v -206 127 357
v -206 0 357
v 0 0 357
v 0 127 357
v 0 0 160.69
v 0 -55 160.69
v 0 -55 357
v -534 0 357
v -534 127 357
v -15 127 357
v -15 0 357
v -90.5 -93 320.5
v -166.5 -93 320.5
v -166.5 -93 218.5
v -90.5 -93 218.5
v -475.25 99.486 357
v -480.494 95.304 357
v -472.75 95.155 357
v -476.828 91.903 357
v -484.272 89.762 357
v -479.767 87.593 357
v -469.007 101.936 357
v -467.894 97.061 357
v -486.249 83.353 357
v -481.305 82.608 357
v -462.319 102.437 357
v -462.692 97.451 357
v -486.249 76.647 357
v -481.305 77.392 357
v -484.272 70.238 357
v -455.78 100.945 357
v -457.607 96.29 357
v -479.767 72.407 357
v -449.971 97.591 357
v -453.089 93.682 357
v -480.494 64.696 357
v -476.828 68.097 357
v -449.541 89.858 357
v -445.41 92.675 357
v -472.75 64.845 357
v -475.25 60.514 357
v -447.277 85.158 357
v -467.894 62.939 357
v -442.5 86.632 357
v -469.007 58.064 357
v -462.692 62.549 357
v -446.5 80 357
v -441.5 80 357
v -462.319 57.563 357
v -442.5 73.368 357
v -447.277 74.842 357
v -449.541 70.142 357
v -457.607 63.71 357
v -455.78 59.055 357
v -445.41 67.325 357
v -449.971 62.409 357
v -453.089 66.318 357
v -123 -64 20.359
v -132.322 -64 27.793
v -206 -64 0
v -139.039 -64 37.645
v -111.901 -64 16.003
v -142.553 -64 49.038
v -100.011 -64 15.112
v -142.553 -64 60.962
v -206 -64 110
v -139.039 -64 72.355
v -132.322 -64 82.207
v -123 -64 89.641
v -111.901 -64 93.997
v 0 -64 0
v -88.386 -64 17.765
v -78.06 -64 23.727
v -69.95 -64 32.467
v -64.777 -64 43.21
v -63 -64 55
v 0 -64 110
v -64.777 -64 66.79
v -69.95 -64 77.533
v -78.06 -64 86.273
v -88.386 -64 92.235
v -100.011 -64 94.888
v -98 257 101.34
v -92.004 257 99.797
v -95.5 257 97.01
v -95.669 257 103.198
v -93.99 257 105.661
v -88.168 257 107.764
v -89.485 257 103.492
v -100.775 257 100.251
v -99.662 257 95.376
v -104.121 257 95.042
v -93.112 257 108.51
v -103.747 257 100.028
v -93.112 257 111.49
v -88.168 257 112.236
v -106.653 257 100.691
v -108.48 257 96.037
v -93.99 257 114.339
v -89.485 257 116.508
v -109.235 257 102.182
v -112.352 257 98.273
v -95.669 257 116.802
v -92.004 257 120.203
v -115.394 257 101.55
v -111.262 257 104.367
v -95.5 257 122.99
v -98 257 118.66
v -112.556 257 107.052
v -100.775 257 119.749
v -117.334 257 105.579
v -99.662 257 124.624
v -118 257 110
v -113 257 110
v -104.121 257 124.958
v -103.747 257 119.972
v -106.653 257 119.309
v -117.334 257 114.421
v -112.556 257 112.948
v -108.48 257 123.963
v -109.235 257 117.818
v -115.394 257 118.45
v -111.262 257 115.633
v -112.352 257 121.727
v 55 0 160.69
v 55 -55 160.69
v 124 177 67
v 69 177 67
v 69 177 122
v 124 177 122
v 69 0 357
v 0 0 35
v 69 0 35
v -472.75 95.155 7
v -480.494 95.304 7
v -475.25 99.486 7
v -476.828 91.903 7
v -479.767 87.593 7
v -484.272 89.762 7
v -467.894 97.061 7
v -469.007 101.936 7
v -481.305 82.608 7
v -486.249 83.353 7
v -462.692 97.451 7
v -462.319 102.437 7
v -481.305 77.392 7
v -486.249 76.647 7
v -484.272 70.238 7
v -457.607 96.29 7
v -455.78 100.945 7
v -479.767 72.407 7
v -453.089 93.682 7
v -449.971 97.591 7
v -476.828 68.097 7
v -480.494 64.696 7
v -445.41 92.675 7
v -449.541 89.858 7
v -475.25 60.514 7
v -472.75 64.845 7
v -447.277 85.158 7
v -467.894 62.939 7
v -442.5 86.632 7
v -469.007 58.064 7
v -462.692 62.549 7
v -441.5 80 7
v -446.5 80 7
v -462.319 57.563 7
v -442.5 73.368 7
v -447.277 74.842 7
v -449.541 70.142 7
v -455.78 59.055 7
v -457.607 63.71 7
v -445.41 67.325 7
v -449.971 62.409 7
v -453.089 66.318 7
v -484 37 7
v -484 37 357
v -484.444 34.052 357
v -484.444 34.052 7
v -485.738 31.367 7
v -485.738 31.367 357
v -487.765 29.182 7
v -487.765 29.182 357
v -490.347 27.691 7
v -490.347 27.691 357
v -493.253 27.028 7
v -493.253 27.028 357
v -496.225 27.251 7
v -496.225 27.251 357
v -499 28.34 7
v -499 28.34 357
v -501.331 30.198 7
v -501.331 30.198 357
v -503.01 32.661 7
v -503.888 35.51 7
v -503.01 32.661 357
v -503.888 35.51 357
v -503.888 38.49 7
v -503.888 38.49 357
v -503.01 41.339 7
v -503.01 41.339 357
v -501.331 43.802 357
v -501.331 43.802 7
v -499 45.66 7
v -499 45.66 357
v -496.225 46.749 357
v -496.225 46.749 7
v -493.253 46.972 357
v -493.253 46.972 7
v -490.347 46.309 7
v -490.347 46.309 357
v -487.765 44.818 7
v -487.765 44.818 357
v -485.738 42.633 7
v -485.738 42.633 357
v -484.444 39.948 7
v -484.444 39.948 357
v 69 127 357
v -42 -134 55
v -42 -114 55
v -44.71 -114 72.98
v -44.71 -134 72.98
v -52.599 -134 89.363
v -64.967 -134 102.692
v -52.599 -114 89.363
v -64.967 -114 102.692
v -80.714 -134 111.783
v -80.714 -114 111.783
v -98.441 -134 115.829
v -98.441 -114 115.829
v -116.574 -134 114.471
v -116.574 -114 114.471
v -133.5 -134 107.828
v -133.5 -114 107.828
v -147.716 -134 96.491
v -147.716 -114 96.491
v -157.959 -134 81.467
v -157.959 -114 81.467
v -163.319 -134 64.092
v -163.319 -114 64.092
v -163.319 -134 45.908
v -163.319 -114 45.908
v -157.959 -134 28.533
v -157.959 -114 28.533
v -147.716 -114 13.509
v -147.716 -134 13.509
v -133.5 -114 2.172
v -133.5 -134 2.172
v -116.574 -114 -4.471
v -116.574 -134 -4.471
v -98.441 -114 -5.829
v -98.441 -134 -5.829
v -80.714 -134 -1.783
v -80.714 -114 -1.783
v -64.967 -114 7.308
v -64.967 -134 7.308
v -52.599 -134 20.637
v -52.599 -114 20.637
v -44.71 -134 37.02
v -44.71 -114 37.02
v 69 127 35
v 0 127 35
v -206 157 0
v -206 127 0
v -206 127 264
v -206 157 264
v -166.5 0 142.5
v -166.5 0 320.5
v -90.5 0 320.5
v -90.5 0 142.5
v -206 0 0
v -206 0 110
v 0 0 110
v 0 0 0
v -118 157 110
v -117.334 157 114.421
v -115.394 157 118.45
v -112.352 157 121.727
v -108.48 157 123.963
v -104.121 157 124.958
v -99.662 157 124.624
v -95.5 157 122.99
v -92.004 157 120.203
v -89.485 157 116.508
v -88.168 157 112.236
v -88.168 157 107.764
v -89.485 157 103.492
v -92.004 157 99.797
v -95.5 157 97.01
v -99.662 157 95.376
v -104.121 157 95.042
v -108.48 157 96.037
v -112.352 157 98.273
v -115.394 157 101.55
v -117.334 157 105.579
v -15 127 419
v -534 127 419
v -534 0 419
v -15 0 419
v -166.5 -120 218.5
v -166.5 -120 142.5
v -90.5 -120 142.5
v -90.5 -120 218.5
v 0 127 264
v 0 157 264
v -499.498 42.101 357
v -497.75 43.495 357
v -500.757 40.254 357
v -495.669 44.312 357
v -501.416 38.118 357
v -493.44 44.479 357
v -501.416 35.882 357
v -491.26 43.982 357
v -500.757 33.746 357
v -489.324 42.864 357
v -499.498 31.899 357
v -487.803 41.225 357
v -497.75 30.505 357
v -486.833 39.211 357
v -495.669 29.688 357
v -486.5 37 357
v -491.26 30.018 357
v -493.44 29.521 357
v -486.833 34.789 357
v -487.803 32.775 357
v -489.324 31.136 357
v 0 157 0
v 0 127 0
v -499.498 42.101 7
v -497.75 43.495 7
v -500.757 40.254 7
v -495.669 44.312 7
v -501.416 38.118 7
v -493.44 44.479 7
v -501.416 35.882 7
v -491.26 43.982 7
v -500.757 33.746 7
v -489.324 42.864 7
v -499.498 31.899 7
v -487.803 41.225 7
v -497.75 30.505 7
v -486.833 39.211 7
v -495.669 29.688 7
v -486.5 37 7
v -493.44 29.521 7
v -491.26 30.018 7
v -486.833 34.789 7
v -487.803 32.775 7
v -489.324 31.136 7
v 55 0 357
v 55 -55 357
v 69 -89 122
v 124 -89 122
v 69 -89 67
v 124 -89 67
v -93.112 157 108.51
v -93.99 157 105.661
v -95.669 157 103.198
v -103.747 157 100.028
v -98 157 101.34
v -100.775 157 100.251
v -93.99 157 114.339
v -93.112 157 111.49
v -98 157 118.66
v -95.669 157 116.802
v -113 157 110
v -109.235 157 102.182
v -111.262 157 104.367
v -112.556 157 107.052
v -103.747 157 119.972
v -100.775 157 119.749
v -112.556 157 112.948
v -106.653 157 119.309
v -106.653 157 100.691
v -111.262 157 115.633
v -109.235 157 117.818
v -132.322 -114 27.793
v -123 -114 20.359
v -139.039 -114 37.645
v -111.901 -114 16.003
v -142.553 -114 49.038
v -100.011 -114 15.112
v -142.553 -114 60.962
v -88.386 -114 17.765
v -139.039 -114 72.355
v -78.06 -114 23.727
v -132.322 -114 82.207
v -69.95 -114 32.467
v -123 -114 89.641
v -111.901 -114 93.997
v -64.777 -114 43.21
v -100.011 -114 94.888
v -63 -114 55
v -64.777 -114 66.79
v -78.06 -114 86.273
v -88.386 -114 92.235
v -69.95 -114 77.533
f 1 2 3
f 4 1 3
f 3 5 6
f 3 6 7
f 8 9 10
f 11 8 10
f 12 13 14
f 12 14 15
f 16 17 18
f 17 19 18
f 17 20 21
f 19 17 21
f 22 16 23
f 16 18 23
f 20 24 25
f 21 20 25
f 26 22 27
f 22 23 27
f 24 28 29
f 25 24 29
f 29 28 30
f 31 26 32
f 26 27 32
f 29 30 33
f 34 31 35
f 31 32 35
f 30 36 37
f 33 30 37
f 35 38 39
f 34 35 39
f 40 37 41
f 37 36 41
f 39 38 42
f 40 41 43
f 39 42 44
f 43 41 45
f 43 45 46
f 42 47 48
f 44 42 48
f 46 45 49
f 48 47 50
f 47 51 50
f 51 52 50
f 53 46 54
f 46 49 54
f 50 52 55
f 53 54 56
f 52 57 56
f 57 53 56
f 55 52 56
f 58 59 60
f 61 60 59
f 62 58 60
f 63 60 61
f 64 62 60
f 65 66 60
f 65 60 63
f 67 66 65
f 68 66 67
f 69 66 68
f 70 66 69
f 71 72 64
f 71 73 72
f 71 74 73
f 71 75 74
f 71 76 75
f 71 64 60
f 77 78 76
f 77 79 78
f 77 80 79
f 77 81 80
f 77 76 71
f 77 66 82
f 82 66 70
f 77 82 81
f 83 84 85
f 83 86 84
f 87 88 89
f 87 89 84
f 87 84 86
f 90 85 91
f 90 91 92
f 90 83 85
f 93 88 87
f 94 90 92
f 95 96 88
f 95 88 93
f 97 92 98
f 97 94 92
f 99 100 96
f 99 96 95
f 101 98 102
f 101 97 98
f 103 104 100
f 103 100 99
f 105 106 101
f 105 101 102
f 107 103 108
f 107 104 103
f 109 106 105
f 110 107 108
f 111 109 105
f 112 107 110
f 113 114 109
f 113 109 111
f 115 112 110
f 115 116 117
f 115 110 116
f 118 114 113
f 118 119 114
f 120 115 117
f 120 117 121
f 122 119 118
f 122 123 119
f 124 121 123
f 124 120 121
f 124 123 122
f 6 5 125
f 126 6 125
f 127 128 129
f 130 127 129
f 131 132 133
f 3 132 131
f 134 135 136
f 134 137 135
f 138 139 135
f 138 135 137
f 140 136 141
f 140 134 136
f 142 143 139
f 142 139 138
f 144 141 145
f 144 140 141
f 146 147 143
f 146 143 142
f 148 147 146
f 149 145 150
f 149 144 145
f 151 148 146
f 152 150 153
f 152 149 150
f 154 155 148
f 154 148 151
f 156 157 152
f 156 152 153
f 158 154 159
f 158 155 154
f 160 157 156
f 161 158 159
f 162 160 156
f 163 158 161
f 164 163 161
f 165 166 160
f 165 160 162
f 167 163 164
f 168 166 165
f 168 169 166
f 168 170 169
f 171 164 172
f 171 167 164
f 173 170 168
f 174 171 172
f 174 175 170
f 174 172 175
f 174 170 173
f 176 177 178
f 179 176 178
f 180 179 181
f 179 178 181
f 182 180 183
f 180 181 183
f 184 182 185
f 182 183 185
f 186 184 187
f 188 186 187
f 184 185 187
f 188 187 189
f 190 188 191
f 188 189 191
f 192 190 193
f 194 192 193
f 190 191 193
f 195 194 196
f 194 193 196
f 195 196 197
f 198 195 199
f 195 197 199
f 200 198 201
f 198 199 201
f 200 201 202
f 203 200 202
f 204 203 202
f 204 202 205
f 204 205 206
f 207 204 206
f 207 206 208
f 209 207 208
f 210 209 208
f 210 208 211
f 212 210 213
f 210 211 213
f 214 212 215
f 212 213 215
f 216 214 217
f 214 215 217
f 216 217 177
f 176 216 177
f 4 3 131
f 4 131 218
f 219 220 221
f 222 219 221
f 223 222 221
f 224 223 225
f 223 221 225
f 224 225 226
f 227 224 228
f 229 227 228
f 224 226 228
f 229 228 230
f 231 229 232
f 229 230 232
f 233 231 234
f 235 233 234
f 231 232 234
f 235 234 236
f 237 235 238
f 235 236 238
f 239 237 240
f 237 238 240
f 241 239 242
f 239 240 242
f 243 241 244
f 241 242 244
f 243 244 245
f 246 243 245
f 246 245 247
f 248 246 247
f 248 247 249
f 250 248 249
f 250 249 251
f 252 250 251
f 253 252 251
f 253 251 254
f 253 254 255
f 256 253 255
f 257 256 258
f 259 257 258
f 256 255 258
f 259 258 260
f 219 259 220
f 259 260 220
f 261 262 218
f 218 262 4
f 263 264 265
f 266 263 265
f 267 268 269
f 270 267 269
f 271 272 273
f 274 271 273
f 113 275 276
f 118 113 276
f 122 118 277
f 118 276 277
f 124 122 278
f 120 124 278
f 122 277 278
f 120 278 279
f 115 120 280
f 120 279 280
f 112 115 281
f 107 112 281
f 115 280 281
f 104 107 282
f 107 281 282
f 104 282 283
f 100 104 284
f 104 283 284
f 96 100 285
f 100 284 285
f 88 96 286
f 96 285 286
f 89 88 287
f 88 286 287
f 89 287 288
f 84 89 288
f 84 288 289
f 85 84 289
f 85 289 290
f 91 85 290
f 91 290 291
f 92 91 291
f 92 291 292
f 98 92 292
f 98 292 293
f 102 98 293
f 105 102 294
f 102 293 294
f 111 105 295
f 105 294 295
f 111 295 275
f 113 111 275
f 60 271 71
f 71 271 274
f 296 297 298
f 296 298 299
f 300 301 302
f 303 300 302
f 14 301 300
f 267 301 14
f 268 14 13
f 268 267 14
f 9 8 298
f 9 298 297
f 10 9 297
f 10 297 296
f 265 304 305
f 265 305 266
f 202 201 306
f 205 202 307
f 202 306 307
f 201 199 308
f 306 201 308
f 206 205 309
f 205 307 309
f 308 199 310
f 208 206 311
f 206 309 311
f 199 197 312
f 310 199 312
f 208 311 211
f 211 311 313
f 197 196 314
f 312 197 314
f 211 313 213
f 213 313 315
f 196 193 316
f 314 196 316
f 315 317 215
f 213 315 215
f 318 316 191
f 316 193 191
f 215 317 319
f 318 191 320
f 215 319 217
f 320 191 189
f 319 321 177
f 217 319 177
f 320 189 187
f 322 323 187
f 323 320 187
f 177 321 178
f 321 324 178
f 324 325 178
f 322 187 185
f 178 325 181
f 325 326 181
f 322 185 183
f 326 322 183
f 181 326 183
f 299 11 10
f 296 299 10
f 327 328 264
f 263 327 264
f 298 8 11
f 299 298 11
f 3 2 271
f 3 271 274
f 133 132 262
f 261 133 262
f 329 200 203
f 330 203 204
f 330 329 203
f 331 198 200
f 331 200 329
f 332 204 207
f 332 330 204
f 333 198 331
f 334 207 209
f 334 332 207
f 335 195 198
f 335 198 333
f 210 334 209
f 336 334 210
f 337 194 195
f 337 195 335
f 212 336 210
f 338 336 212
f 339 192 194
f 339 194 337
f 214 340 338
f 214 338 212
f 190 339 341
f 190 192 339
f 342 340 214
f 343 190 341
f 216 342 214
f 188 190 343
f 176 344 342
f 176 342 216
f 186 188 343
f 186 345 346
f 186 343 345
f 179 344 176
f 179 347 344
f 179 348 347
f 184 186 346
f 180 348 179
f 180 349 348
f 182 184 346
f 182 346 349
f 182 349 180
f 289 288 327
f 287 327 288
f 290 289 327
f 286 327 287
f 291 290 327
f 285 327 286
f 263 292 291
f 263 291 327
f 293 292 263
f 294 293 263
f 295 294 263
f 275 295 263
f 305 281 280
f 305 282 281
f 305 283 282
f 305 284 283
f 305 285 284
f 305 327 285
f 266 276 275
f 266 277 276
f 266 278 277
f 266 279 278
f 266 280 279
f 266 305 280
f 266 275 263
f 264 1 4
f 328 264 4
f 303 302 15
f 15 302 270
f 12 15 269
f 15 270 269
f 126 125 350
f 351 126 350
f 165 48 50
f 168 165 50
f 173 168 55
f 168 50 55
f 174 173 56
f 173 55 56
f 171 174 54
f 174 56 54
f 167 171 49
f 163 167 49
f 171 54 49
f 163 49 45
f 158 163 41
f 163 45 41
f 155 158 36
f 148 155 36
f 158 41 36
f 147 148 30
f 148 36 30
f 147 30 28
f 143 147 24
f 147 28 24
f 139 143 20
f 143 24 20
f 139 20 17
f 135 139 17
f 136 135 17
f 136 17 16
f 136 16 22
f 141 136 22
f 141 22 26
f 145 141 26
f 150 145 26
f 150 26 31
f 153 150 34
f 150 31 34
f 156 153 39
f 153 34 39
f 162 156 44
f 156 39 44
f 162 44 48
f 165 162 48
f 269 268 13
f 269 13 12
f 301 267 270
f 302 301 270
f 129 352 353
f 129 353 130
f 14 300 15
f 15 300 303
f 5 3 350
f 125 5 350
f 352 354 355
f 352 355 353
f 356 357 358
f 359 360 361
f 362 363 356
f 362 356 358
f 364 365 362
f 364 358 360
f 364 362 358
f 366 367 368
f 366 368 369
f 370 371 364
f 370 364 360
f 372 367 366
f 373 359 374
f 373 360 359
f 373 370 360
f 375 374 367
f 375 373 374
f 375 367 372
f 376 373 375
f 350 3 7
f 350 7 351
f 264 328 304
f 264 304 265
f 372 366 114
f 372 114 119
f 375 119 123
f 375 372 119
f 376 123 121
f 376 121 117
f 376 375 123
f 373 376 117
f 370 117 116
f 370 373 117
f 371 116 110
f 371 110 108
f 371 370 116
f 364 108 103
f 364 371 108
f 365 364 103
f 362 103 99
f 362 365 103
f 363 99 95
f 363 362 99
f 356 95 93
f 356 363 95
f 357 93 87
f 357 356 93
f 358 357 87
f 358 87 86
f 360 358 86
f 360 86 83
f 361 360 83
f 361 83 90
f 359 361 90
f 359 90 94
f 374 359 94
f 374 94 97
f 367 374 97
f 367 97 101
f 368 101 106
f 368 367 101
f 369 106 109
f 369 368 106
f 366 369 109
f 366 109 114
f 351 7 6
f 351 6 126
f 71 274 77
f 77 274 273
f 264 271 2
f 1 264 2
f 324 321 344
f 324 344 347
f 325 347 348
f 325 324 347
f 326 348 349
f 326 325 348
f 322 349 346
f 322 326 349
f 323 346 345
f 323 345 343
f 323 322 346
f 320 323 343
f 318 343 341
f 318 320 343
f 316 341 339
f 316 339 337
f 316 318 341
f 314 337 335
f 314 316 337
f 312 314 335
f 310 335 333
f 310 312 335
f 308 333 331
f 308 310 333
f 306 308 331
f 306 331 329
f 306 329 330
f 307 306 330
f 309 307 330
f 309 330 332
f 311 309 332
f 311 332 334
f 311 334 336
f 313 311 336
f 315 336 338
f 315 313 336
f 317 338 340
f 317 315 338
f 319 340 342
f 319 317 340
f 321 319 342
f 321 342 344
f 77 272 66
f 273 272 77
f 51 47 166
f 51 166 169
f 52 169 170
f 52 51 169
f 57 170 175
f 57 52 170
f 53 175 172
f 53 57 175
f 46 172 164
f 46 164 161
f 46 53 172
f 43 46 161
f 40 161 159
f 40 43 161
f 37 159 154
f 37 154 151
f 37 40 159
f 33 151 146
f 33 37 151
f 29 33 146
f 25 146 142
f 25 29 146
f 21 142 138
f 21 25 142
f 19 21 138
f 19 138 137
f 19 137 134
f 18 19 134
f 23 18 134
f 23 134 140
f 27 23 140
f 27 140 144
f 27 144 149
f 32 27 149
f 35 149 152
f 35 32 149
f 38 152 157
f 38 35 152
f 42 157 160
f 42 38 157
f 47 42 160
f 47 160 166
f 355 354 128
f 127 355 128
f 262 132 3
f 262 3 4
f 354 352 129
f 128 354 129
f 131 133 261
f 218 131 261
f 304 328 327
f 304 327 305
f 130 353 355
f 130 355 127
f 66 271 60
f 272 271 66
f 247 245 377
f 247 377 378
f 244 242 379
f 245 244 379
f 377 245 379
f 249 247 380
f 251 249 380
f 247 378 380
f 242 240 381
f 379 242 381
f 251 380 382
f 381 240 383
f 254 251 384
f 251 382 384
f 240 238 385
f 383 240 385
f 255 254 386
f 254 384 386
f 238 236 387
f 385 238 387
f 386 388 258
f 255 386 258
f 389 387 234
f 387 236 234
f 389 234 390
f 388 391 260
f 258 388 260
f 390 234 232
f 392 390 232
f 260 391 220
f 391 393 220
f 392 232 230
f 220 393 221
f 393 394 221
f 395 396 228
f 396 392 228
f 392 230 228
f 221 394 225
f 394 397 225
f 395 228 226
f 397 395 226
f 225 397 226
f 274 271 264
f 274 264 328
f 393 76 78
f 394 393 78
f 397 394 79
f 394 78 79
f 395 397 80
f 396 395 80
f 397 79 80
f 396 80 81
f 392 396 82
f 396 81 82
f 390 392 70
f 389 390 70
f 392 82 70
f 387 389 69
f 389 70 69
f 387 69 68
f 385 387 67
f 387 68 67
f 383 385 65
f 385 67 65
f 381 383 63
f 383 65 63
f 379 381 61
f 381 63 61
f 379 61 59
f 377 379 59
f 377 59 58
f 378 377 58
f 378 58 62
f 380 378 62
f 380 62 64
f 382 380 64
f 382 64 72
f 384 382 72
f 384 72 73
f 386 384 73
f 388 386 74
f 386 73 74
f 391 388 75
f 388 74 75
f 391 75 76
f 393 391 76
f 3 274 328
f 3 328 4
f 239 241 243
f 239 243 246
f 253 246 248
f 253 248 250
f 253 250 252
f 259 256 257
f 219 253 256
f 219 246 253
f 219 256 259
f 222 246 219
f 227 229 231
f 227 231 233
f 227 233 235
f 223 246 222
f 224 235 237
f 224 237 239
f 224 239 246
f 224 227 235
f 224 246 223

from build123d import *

# Parameters (mm, degrees)
F0_W      = 206
F0_H      = 357
F1_DEPTH  = 127
F2_W      = 519
F2_H      = 127
F3_DEPTH  = 62
F4_W      = 127
F4_H      = 322
F5_DEPTH  = 69
F6_W      = 55
F6_H      = 196.31
F7_DEPTH  = 55
F8_W      = 266
F8_H      = 55
F9_DEPTH  = 55
F10_W     = 76
F10_H     = 178
F11_DEPTH = 120
F12_W     = 86
F12_H     = 107
F13_DEPTH = 27
F14_W     = 206
F14_H     = 110
F15_DEPTH = 64
F16_R     = 40
F17_DEPTH = 50
F18_R     = 61
F19_DEPTH = 20
F20_W     = 206
F20_H     = 264
F21_DEPTH = 30
F22_R     = 15
F22_R_2   = 10
F23_DEPTH = 100
F24_R     = 22.5
F24_R_2   = 17.5
F24_R_3   = 10
F24_R_4   = 7.5
F25_DEPTH = 350


with BuildPart() as f1:
    # F0 (on Front) → F1 (new body)
    with BuildSketch(Plane.XZ):
        with Locations((-103, 178.5)):
            Rectangle(F0_W, F0_H)
    extrude(amount=-F1_DEPTH)


with BuildPart() as f3:
    # F2 (on face) → F3 (new body)
    with BuildSketch(Plane.XY.offset(357)):
        with Locations((-274.5, 63.5)):
            Rectangle(F2_W, F2_H)
    extrude(amount=F3_DEPTH)


with BuildPart() as f5:
    # F4 (on face) → F5 (new body)
    with BuildSketch(Plane.YZ):
        with Locations((63.5, 196)):
            Rectangle(F4_W, F4_H)
    extrude(amount=F5_DEPTH)


with BuildPart() as f7:
    # F6 (on face) → F7 (new body)
    with BuildSketch(Plane.XZ):
        with Locations((27.5, 258.845)):
            Rectangle(F6_W, F6_H)
    extrude(amount=F7_DEPTH)


with BuildPart() as f9:
    # F8 (on face) → F9 (new body)
    with BuildSketch(Plane.YZ.offset(69)):
        with Locations((44, 94.5)):
            Rectangle(F8_W, F8_H)
    extrude(amount=F9_DEPTH)


with BuildPart() as f11:
    # F10 (on face) → F11 (new body)
    with BuildSketch(Plane.XZ):
        with Locations((-128.5, 231.5)):
            Rectangle(F10_W, F10_H)
    extrude(amount=F11_DEPTH)

    # F12 (on face) → F13 (cut)
    with BuildSketch(Plane.XZ.offset(120)):
        with Locations((-128.5, 272)):
            Rectangle(F12_W, F12_H)
    extrude(amount=-F13_DEPTH, mode=Mode.SUBTRACT)


with BuildPart() as f15:
    # F14 (on face) → F15 (new body)
    with BuildSketch(Plane.XZ):
        with Locations((-103, 55)):
            Rectangle(F14_W, F14_H)
    extrude(amount=F15_DEPTH)

    # F16 (on face) → F17 (join)
    with BuildSketch(Plane.XZ.offset(64)):
        with Locations((-103, 55)):
            Circle(F16_R)
    extrude(amount=F17_DEPTH)

    # F18 (on face) → F19 (join)
    with BuildSketch(Plane.XZ.offset(114)):
        with Locations((-103, 55)):
            Circle(F18_R)
    extrude(amount=F19_DEPTH)


with BuildPart() as f21:
    # F20 (on face) → F21 (new body)
    with BuildSketch(Plane(origin=(0, 127, 0), x_dir=(-1, 0, 0), z_dir=(0, 1, 0))):
        with Locations((103, 132)):
            Rectangle(F20_W, F20_H)
    extrude(amount=F21_DEPTH)

    # F22 (on face) → F23 (join)
    with BuildSketch(Plane(origin=(0, 157, 0), x_dir=(-1, 0, 0), z_dir=(0, 1, 0))):
        with Locations((103, 110)):
            Circle(F22_R)
        with Locations((103, 110)):
            Circle(F22_R_2, mode=Mode.SUBTRACT)
    extrude(amount=F23_DEPTH)


with BuildPart() as f25:
    # F24 (on face) → F25 (new body)
    with BuildSketch(Plane(origin=(0, 0, 357), x_dir=(1, 0, 0), z_dir=(0, 0, -1))):
        with Locations((-464, -80)):
            Circle(F24_R)
        with Locations((-464, -80)):
            Circle(F24_R_2, mode=Mode.SUBTRACT)
        with Locations((-494, -37)):
            Circle(F24_R_3)
        with Locations((-494, -37)):
            Circle(F24_R_4, mode=Mode.SUBTRACT)
    extrude(amount=F25_DEPTH)


solid = Compound([f1.part, f3.part, f5.part, f7.part, f9.part, f11.part, f15.part, f21.part, f25.part])
